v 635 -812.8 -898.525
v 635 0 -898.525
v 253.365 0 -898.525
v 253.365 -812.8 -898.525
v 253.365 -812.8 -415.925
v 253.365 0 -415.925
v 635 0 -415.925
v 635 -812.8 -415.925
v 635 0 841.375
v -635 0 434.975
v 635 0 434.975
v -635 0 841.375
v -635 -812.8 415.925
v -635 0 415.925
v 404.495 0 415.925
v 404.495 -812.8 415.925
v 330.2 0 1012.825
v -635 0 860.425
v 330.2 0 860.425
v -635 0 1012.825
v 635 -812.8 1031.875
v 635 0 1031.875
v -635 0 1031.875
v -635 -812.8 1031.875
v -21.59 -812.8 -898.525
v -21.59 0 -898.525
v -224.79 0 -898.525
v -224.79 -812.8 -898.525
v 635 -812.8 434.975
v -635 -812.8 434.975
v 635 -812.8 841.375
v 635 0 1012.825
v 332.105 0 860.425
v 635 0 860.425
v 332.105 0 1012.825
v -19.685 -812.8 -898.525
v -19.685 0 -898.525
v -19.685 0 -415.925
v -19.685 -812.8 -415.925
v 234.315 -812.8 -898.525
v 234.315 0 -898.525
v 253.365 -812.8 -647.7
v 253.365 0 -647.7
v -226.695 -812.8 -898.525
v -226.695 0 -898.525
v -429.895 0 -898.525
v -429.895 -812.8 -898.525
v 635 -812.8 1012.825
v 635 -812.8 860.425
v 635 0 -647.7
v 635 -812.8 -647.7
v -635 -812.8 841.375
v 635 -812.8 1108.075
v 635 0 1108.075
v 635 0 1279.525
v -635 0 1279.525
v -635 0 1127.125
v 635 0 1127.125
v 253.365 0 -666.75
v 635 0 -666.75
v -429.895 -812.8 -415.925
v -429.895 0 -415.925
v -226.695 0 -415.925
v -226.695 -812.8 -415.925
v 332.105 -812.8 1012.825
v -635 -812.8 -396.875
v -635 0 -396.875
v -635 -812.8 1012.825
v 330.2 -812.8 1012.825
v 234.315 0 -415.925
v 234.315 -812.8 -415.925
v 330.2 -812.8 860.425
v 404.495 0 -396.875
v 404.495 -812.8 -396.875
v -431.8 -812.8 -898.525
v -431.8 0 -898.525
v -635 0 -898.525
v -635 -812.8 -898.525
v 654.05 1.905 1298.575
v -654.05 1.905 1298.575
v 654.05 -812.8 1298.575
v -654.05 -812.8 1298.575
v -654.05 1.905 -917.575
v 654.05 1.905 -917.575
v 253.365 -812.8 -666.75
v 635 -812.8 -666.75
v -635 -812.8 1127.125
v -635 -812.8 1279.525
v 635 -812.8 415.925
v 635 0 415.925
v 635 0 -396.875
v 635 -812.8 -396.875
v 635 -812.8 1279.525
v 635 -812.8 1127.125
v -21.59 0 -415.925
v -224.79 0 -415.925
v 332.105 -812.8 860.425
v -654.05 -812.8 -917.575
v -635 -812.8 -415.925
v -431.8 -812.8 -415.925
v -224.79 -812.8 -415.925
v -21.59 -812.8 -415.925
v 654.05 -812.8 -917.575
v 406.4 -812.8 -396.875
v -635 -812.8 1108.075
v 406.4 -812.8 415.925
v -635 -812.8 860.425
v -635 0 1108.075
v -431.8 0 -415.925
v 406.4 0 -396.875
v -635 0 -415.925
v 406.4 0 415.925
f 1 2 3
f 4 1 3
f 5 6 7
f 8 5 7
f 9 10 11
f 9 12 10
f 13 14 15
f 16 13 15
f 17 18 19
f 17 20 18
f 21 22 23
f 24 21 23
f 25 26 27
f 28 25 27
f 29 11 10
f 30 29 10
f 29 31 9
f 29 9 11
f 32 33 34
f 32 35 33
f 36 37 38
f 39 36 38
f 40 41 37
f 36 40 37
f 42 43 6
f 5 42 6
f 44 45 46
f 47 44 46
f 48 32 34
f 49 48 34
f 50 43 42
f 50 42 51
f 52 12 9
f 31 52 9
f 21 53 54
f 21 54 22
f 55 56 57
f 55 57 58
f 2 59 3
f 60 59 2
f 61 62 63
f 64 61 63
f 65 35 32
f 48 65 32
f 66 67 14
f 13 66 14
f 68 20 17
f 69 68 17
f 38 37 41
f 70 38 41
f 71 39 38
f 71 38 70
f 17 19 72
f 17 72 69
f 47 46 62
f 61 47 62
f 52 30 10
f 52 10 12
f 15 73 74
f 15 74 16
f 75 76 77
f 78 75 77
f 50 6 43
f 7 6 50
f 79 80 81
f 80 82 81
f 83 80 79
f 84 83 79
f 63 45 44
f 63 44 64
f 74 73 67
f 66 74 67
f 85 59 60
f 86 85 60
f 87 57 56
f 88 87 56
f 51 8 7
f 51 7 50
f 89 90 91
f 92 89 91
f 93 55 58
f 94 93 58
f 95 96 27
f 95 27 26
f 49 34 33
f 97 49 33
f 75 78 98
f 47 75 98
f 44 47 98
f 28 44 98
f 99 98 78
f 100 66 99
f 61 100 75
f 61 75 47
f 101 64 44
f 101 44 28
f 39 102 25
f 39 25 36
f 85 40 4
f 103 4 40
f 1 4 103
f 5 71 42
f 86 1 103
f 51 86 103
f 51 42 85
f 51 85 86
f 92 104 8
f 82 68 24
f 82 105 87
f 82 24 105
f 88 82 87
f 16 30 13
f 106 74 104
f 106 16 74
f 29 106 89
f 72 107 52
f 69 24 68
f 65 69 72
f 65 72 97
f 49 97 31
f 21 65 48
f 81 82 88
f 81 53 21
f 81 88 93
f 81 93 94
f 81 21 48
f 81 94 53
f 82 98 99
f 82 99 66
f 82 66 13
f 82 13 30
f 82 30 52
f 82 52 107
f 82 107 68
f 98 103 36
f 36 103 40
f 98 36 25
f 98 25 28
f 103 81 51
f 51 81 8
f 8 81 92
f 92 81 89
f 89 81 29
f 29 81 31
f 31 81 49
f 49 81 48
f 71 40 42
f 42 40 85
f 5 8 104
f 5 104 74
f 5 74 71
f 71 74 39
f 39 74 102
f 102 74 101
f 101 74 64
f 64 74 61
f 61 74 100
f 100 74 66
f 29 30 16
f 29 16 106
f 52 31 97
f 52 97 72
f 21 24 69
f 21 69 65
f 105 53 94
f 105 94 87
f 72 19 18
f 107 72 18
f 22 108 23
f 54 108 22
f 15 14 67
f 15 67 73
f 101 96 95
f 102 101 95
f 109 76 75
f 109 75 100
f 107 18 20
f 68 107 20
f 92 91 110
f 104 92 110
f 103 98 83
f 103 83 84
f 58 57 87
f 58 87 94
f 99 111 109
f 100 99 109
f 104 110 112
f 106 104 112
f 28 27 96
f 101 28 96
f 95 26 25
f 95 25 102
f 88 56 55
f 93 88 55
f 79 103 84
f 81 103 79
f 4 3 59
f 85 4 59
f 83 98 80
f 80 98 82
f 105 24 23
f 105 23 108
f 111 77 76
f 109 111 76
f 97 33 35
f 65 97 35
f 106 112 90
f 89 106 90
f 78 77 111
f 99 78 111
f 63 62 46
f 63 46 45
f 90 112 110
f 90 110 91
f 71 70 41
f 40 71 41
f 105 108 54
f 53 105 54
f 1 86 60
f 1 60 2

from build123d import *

# Parameters (mm, degrees)
F0_W     = 1270
F0_H     = 19.05
F0_W_2   = 1.905
F0_H_2   = 482.6
F0_H_3   = 152.4
F0_H_4   = 812.8
F0_W_3   = 381.635
F1_DEPTH = 812.8
F3_START = -812.8
F2_W     = 1308.1
F2_H     = 2216.15
F3_DEPTH = 1.905


# Not quite as in the source:
# - a feature names something its author has since deleted; it is built from what else it names


with BuildPart() as f1:
    # F0 (on Front) → F1 (new body)
    with BuildSketch(Plane.XZ):
        Polygon((-635, -396.875), (-635, 415.925), (-635, 434.975), (-635, 841.375), (-635, 860.425), (-635, 1012.825), (-635, 1031.875), (-635, 1108.075), (-635, 1127.125), (-635, 1279.525), (-635, 1298.575), (-654.05, 1298.575), (-654.05, -917.575), (-635, -917.575), (-635, -898.525), (-635, -415.925), align=None)
        Polygon((-635, 434.975), (-635, 415.925), (404.495, 415.925), (406.4, 415.925), (635, 415.925), (635, 434.975), align=None)
        Polygon((-635, 860.425), (-635, 841.375), (635, 841.375), (635, 860.425), (332.105, 860.425), (330.2, 860.425), (0, 860.425), align=None)
        Polygon((-635, 1031.875), (-635, 1012.825), (0, 1012.825), (330.2, 1012.825), (332.105, 1012.825), (635, 1012.825), (635, 1031.875), align=None)
        with Locations((0, 1289.05)):
            Rectangle(F0_W, F0_H)
        Polygon((635, 841.375), (635, 434.975), (635, 415.925), (635, -396.875), (635, -415.925), (635, -647.7), (635, -666.75), (635, -898.525), (635, -917.575), (654.05, -917.575), (654.05, 1298.575), (635, 1298.575), (635, 1279.525), (635, 1127.125), (635, 1108.075), (635, 1031.875), (635, 1012.825), (635, 860.425), align=None)
        Polygon((404.495, -396.875), (-635, -396.875), (-635, -415.925), (-431.8, -415.925), (-429.895, -415.925), (-226.695, -415.925), (-224.79, -415.925), (-21.59, -415.925), (-19.685, -415.925), (234.315, -415.925), (253.365, -415.925), (635, -415.925), (635, -396.875), (406.4, -396.875), align=None)
        Polygon((-431.8, -898.525), (-635, -898.525), (-635, -917.575), (635, -917.575), (635, -898.525), (253.365, -898.525), (234.315, -898.525), (-19.685, -898.525), (-21.59, -898.525), (-224.79, -898.525), (-226.695, -898.525), (-429.895, -898.525), align=None)
        with Locations((-430.8475, -657.225)):
            Rectangle(F0_W_2, F0_H_2)
        with Locations((-225.7425, -657.225)):
            Rectangle(F0_W_2, F0_H_2)
        with Locations((-20.6375, -657.225)):
            Rectangle(F0_W_2, F0_H_2)
        with Locations((0, 1117.6)):
            Rectangle(F0_W, F0_H)
        with Locations((331.1525, 936.625)):
            Rectangle(F0_W_2, F0_H_3)
        with Locations((405.4475, 9.525)):
            Rectangle(F0_W_2, F0_H_4)
        Polygon((253.365, -647.7), (253.365, -415.925), (234.315, -415.925), (234.315, -898.525), (253.365, -898.525), (253.365, -666.75), align=None)
        with Locations((444.1825, -657.225)):
            Rectangle(F0_W_3, F0_H)
    extrude(amount=F1_DEPTH)

    # F2 (on face) → F3 (join)
    with BuildSketch(Plane.XZ.offset(812.8).offset(F3_START)):
        with Locations((0, 190.5)):
            Rectangle(F2_W, F2_H)
    extrude(amount=-F3_DEPTH)


solid = f1.part
